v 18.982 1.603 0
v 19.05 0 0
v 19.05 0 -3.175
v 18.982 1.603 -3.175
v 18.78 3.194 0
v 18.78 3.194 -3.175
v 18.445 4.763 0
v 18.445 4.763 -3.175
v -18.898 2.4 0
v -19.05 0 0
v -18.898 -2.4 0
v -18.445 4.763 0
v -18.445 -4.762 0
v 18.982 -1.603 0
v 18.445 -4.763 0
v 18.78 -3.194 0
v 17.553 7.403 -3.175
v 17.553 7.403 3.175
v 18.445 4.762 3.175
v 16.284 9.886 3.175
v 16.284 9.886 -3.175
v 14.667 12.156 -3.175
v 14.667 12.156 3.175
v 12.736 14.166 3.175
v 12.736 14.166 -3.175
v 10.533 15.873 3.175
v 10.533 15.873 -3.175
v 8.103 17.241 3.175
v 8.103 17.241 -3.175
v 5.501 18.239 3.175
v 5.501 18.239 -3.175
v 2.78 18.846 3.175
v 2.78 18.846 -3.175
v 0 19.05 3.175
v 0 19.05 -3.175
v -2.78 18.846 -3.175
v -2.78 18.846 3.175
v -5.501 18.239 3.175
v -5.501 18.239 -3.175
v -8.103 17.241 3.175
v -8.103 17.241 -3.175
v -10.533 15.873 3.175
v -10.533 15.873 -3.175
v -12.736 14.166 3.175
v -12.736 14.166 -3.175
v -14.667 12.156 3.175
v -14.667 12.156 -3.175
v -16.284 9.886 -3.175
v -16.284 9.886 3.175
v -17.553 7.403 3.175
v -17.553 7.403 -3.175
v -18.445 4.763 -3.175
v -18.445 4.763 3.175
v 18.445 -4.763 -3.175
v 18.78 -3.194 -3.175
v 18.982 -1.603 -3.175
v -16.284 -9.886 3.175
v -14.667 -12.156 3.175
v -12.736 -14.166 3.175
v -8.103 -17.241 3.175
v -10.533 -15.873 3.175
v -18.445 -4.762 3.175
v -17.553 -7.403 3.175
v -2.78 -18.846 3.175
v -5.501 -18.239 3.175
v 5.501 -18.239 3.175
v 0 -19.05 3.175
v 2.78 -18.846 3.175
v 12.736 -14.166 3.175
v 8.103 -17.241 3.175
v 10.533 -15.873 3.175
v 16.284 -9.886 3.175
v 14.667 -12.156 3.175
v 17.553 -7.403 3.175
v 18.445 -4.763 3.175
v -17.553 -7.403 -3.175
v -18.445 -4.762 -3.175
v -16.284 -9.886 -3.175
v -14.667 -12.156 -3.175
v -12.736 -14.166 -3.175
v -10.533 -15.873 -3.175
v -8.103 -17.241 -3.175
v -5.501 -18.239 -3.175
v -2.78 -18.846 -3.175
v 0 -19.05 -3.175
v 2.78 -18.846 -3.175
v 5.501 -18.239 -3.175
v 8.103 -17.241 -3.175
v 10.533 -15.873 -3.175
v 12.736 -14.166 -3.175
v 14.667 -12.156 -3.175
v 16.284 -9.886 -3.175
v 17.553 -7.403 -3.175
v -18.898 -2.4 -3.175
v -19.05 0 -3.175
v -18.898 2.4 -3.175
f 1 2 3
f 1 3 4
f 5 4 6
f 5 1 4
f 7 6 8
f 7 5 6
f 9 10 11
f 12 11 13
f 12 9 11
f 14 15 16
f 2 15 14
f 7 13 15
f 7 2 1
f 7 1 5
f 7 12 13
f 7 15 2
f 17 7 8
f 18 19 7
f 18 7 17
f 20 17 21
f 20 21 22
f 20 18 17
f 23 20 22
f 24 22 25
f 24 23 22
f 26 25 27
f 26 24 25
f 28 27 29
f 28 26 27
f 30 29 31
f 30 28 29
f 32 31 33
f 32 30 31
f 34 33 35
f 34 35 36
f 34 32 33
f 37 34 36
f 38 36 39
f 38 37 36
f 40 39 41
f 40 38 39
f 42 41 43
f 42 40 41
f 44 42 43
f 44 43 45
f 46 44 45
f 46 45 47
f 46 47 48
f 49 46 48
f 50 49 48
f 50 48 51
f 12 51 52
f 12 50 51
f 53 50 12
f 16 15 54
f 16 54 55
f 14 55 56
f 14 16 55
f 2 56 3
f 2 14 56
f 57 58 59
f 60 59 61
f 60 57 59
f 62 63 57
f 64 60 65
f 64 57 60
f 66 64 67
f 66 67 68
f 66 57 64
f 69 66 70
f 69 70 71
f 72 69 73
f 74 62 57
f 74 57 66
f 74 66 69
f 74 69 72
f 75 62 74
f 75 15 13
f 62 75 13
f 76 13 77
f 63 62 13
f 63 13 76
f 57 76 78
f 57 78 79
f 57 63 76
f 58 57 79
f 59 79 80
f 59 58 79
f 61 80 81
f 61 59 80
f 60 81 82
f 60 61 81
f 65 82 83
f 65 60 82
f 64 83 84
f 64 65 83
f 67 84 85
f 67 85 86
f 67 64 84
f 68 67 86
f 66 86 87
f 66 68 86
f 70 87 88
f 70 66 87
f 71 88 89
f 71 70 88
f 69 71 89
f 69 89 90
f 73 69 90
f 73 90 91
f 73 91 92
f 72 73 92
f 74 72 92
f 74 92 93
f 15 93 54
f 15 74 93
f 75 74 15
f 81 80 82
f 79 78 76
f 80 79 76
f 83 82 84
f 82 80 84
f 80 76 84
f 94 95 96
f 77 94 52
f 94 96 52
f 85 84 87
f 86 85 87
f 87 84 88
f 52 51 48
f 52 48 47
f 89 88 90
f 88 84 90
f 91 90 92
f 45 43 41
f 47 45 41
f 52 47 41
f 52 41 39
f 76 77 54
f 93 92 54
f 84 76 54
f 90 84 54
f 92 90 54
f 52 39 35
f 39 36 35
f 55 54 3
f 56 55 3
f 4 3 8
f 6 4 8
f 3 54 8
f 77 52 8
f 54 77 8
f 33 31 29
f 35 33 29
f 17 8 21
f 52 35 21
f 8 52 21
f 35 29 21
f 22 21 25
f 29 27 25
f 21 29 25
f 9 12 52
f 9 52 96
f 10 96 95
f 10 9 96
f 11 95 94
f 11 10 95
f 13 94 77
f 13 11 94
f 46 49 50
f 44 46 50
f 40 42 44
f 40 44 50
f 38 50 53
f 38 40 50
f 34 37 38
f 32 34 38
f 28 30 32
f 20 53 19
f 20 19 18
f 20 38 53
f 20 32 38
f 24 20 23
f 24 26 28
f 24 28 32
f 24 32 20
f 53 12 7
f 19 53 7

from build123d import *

# Parameters (mm, degrees)
F1_DEPTH = 3.175
F0_W     = 36.8901663726
F0_H     = 9.525
F2_DEPTH = 3.175


with BuildPart() as f1:
    # F0 (on Top) → F1 (new body)
    with BuildSketch(Plane.XY):
        with BuildLine():
            Line((-18.4450831863, 4.7625), (18.4450831863, 4.7625))
            ThreePointArc((18.4450831863, 4.7625), (0, 19.05), (-18.4450831863, 4.7625))
        make_face()
    extrude(amount=F1_DEPTH)



with BuildPart() as f1b:
    # F0 (on Top) → F1, piece 2 (new body)
    with BuildSketch(Plane.XY):
        with BuildLine():
            ThreePointArc((-18.4450831863, -4.7625), (0, -19.05), (18.4450831863, -4.7625))
            Line((18.4450831863, -4.7625), (-18.4450831863, -4.7625))
        make_face()
    extrude(amount=F1_DEPTH)


with BuildPart() as f1_1:
    add(f1.part)

    add(f1b.part)  # F2 merges F1b
    # F0 (on Top) → F2 (join)
    with BuildSketch(Plane.XY):
        with BuildLine():
            ThreePointArc((18.4450831863, -4.7625), (18.8981657139, -2.4003817718), (19.05, 0))
            ThreePointArc((19.05, 0), (18.8981657139, 2.4003817718), (18.4450831863, 4.7625))
            Line((18.4450831863, 4.7625), (18.4450831863, -4.7625))
        make_face()
        with BuildLine():
            Line((-18.4450831863, 4.7625), (18.4450831863, 4.7625))
            ThreePointArc((18.4450831863, 4.7625), (0, 19.05), (-18.4450831863, 4.7625))
        make_face()
        Rectangle(F0_W, F0_H)
        with BuildLine():
            ThreePointArc((-18.4450831863, -4.7625), (0, -19.05), (18.4450831863, -4.7625))
            Line((18.4450831863, -4.7625), (-18.4450831863, -4.7625))
        make_face()
        with BuildLine():
            Line((-18.4450831863, -4.7625), (-18.4450831863, 4.7625))
            ThreePointArc((-18.4450831863, 4.7625), (-19.05, 0), (-18.4450831863, -4.7625))
        make_face()
    extrude(amount=-F2_DEPTH)


solid = f1_1.part
